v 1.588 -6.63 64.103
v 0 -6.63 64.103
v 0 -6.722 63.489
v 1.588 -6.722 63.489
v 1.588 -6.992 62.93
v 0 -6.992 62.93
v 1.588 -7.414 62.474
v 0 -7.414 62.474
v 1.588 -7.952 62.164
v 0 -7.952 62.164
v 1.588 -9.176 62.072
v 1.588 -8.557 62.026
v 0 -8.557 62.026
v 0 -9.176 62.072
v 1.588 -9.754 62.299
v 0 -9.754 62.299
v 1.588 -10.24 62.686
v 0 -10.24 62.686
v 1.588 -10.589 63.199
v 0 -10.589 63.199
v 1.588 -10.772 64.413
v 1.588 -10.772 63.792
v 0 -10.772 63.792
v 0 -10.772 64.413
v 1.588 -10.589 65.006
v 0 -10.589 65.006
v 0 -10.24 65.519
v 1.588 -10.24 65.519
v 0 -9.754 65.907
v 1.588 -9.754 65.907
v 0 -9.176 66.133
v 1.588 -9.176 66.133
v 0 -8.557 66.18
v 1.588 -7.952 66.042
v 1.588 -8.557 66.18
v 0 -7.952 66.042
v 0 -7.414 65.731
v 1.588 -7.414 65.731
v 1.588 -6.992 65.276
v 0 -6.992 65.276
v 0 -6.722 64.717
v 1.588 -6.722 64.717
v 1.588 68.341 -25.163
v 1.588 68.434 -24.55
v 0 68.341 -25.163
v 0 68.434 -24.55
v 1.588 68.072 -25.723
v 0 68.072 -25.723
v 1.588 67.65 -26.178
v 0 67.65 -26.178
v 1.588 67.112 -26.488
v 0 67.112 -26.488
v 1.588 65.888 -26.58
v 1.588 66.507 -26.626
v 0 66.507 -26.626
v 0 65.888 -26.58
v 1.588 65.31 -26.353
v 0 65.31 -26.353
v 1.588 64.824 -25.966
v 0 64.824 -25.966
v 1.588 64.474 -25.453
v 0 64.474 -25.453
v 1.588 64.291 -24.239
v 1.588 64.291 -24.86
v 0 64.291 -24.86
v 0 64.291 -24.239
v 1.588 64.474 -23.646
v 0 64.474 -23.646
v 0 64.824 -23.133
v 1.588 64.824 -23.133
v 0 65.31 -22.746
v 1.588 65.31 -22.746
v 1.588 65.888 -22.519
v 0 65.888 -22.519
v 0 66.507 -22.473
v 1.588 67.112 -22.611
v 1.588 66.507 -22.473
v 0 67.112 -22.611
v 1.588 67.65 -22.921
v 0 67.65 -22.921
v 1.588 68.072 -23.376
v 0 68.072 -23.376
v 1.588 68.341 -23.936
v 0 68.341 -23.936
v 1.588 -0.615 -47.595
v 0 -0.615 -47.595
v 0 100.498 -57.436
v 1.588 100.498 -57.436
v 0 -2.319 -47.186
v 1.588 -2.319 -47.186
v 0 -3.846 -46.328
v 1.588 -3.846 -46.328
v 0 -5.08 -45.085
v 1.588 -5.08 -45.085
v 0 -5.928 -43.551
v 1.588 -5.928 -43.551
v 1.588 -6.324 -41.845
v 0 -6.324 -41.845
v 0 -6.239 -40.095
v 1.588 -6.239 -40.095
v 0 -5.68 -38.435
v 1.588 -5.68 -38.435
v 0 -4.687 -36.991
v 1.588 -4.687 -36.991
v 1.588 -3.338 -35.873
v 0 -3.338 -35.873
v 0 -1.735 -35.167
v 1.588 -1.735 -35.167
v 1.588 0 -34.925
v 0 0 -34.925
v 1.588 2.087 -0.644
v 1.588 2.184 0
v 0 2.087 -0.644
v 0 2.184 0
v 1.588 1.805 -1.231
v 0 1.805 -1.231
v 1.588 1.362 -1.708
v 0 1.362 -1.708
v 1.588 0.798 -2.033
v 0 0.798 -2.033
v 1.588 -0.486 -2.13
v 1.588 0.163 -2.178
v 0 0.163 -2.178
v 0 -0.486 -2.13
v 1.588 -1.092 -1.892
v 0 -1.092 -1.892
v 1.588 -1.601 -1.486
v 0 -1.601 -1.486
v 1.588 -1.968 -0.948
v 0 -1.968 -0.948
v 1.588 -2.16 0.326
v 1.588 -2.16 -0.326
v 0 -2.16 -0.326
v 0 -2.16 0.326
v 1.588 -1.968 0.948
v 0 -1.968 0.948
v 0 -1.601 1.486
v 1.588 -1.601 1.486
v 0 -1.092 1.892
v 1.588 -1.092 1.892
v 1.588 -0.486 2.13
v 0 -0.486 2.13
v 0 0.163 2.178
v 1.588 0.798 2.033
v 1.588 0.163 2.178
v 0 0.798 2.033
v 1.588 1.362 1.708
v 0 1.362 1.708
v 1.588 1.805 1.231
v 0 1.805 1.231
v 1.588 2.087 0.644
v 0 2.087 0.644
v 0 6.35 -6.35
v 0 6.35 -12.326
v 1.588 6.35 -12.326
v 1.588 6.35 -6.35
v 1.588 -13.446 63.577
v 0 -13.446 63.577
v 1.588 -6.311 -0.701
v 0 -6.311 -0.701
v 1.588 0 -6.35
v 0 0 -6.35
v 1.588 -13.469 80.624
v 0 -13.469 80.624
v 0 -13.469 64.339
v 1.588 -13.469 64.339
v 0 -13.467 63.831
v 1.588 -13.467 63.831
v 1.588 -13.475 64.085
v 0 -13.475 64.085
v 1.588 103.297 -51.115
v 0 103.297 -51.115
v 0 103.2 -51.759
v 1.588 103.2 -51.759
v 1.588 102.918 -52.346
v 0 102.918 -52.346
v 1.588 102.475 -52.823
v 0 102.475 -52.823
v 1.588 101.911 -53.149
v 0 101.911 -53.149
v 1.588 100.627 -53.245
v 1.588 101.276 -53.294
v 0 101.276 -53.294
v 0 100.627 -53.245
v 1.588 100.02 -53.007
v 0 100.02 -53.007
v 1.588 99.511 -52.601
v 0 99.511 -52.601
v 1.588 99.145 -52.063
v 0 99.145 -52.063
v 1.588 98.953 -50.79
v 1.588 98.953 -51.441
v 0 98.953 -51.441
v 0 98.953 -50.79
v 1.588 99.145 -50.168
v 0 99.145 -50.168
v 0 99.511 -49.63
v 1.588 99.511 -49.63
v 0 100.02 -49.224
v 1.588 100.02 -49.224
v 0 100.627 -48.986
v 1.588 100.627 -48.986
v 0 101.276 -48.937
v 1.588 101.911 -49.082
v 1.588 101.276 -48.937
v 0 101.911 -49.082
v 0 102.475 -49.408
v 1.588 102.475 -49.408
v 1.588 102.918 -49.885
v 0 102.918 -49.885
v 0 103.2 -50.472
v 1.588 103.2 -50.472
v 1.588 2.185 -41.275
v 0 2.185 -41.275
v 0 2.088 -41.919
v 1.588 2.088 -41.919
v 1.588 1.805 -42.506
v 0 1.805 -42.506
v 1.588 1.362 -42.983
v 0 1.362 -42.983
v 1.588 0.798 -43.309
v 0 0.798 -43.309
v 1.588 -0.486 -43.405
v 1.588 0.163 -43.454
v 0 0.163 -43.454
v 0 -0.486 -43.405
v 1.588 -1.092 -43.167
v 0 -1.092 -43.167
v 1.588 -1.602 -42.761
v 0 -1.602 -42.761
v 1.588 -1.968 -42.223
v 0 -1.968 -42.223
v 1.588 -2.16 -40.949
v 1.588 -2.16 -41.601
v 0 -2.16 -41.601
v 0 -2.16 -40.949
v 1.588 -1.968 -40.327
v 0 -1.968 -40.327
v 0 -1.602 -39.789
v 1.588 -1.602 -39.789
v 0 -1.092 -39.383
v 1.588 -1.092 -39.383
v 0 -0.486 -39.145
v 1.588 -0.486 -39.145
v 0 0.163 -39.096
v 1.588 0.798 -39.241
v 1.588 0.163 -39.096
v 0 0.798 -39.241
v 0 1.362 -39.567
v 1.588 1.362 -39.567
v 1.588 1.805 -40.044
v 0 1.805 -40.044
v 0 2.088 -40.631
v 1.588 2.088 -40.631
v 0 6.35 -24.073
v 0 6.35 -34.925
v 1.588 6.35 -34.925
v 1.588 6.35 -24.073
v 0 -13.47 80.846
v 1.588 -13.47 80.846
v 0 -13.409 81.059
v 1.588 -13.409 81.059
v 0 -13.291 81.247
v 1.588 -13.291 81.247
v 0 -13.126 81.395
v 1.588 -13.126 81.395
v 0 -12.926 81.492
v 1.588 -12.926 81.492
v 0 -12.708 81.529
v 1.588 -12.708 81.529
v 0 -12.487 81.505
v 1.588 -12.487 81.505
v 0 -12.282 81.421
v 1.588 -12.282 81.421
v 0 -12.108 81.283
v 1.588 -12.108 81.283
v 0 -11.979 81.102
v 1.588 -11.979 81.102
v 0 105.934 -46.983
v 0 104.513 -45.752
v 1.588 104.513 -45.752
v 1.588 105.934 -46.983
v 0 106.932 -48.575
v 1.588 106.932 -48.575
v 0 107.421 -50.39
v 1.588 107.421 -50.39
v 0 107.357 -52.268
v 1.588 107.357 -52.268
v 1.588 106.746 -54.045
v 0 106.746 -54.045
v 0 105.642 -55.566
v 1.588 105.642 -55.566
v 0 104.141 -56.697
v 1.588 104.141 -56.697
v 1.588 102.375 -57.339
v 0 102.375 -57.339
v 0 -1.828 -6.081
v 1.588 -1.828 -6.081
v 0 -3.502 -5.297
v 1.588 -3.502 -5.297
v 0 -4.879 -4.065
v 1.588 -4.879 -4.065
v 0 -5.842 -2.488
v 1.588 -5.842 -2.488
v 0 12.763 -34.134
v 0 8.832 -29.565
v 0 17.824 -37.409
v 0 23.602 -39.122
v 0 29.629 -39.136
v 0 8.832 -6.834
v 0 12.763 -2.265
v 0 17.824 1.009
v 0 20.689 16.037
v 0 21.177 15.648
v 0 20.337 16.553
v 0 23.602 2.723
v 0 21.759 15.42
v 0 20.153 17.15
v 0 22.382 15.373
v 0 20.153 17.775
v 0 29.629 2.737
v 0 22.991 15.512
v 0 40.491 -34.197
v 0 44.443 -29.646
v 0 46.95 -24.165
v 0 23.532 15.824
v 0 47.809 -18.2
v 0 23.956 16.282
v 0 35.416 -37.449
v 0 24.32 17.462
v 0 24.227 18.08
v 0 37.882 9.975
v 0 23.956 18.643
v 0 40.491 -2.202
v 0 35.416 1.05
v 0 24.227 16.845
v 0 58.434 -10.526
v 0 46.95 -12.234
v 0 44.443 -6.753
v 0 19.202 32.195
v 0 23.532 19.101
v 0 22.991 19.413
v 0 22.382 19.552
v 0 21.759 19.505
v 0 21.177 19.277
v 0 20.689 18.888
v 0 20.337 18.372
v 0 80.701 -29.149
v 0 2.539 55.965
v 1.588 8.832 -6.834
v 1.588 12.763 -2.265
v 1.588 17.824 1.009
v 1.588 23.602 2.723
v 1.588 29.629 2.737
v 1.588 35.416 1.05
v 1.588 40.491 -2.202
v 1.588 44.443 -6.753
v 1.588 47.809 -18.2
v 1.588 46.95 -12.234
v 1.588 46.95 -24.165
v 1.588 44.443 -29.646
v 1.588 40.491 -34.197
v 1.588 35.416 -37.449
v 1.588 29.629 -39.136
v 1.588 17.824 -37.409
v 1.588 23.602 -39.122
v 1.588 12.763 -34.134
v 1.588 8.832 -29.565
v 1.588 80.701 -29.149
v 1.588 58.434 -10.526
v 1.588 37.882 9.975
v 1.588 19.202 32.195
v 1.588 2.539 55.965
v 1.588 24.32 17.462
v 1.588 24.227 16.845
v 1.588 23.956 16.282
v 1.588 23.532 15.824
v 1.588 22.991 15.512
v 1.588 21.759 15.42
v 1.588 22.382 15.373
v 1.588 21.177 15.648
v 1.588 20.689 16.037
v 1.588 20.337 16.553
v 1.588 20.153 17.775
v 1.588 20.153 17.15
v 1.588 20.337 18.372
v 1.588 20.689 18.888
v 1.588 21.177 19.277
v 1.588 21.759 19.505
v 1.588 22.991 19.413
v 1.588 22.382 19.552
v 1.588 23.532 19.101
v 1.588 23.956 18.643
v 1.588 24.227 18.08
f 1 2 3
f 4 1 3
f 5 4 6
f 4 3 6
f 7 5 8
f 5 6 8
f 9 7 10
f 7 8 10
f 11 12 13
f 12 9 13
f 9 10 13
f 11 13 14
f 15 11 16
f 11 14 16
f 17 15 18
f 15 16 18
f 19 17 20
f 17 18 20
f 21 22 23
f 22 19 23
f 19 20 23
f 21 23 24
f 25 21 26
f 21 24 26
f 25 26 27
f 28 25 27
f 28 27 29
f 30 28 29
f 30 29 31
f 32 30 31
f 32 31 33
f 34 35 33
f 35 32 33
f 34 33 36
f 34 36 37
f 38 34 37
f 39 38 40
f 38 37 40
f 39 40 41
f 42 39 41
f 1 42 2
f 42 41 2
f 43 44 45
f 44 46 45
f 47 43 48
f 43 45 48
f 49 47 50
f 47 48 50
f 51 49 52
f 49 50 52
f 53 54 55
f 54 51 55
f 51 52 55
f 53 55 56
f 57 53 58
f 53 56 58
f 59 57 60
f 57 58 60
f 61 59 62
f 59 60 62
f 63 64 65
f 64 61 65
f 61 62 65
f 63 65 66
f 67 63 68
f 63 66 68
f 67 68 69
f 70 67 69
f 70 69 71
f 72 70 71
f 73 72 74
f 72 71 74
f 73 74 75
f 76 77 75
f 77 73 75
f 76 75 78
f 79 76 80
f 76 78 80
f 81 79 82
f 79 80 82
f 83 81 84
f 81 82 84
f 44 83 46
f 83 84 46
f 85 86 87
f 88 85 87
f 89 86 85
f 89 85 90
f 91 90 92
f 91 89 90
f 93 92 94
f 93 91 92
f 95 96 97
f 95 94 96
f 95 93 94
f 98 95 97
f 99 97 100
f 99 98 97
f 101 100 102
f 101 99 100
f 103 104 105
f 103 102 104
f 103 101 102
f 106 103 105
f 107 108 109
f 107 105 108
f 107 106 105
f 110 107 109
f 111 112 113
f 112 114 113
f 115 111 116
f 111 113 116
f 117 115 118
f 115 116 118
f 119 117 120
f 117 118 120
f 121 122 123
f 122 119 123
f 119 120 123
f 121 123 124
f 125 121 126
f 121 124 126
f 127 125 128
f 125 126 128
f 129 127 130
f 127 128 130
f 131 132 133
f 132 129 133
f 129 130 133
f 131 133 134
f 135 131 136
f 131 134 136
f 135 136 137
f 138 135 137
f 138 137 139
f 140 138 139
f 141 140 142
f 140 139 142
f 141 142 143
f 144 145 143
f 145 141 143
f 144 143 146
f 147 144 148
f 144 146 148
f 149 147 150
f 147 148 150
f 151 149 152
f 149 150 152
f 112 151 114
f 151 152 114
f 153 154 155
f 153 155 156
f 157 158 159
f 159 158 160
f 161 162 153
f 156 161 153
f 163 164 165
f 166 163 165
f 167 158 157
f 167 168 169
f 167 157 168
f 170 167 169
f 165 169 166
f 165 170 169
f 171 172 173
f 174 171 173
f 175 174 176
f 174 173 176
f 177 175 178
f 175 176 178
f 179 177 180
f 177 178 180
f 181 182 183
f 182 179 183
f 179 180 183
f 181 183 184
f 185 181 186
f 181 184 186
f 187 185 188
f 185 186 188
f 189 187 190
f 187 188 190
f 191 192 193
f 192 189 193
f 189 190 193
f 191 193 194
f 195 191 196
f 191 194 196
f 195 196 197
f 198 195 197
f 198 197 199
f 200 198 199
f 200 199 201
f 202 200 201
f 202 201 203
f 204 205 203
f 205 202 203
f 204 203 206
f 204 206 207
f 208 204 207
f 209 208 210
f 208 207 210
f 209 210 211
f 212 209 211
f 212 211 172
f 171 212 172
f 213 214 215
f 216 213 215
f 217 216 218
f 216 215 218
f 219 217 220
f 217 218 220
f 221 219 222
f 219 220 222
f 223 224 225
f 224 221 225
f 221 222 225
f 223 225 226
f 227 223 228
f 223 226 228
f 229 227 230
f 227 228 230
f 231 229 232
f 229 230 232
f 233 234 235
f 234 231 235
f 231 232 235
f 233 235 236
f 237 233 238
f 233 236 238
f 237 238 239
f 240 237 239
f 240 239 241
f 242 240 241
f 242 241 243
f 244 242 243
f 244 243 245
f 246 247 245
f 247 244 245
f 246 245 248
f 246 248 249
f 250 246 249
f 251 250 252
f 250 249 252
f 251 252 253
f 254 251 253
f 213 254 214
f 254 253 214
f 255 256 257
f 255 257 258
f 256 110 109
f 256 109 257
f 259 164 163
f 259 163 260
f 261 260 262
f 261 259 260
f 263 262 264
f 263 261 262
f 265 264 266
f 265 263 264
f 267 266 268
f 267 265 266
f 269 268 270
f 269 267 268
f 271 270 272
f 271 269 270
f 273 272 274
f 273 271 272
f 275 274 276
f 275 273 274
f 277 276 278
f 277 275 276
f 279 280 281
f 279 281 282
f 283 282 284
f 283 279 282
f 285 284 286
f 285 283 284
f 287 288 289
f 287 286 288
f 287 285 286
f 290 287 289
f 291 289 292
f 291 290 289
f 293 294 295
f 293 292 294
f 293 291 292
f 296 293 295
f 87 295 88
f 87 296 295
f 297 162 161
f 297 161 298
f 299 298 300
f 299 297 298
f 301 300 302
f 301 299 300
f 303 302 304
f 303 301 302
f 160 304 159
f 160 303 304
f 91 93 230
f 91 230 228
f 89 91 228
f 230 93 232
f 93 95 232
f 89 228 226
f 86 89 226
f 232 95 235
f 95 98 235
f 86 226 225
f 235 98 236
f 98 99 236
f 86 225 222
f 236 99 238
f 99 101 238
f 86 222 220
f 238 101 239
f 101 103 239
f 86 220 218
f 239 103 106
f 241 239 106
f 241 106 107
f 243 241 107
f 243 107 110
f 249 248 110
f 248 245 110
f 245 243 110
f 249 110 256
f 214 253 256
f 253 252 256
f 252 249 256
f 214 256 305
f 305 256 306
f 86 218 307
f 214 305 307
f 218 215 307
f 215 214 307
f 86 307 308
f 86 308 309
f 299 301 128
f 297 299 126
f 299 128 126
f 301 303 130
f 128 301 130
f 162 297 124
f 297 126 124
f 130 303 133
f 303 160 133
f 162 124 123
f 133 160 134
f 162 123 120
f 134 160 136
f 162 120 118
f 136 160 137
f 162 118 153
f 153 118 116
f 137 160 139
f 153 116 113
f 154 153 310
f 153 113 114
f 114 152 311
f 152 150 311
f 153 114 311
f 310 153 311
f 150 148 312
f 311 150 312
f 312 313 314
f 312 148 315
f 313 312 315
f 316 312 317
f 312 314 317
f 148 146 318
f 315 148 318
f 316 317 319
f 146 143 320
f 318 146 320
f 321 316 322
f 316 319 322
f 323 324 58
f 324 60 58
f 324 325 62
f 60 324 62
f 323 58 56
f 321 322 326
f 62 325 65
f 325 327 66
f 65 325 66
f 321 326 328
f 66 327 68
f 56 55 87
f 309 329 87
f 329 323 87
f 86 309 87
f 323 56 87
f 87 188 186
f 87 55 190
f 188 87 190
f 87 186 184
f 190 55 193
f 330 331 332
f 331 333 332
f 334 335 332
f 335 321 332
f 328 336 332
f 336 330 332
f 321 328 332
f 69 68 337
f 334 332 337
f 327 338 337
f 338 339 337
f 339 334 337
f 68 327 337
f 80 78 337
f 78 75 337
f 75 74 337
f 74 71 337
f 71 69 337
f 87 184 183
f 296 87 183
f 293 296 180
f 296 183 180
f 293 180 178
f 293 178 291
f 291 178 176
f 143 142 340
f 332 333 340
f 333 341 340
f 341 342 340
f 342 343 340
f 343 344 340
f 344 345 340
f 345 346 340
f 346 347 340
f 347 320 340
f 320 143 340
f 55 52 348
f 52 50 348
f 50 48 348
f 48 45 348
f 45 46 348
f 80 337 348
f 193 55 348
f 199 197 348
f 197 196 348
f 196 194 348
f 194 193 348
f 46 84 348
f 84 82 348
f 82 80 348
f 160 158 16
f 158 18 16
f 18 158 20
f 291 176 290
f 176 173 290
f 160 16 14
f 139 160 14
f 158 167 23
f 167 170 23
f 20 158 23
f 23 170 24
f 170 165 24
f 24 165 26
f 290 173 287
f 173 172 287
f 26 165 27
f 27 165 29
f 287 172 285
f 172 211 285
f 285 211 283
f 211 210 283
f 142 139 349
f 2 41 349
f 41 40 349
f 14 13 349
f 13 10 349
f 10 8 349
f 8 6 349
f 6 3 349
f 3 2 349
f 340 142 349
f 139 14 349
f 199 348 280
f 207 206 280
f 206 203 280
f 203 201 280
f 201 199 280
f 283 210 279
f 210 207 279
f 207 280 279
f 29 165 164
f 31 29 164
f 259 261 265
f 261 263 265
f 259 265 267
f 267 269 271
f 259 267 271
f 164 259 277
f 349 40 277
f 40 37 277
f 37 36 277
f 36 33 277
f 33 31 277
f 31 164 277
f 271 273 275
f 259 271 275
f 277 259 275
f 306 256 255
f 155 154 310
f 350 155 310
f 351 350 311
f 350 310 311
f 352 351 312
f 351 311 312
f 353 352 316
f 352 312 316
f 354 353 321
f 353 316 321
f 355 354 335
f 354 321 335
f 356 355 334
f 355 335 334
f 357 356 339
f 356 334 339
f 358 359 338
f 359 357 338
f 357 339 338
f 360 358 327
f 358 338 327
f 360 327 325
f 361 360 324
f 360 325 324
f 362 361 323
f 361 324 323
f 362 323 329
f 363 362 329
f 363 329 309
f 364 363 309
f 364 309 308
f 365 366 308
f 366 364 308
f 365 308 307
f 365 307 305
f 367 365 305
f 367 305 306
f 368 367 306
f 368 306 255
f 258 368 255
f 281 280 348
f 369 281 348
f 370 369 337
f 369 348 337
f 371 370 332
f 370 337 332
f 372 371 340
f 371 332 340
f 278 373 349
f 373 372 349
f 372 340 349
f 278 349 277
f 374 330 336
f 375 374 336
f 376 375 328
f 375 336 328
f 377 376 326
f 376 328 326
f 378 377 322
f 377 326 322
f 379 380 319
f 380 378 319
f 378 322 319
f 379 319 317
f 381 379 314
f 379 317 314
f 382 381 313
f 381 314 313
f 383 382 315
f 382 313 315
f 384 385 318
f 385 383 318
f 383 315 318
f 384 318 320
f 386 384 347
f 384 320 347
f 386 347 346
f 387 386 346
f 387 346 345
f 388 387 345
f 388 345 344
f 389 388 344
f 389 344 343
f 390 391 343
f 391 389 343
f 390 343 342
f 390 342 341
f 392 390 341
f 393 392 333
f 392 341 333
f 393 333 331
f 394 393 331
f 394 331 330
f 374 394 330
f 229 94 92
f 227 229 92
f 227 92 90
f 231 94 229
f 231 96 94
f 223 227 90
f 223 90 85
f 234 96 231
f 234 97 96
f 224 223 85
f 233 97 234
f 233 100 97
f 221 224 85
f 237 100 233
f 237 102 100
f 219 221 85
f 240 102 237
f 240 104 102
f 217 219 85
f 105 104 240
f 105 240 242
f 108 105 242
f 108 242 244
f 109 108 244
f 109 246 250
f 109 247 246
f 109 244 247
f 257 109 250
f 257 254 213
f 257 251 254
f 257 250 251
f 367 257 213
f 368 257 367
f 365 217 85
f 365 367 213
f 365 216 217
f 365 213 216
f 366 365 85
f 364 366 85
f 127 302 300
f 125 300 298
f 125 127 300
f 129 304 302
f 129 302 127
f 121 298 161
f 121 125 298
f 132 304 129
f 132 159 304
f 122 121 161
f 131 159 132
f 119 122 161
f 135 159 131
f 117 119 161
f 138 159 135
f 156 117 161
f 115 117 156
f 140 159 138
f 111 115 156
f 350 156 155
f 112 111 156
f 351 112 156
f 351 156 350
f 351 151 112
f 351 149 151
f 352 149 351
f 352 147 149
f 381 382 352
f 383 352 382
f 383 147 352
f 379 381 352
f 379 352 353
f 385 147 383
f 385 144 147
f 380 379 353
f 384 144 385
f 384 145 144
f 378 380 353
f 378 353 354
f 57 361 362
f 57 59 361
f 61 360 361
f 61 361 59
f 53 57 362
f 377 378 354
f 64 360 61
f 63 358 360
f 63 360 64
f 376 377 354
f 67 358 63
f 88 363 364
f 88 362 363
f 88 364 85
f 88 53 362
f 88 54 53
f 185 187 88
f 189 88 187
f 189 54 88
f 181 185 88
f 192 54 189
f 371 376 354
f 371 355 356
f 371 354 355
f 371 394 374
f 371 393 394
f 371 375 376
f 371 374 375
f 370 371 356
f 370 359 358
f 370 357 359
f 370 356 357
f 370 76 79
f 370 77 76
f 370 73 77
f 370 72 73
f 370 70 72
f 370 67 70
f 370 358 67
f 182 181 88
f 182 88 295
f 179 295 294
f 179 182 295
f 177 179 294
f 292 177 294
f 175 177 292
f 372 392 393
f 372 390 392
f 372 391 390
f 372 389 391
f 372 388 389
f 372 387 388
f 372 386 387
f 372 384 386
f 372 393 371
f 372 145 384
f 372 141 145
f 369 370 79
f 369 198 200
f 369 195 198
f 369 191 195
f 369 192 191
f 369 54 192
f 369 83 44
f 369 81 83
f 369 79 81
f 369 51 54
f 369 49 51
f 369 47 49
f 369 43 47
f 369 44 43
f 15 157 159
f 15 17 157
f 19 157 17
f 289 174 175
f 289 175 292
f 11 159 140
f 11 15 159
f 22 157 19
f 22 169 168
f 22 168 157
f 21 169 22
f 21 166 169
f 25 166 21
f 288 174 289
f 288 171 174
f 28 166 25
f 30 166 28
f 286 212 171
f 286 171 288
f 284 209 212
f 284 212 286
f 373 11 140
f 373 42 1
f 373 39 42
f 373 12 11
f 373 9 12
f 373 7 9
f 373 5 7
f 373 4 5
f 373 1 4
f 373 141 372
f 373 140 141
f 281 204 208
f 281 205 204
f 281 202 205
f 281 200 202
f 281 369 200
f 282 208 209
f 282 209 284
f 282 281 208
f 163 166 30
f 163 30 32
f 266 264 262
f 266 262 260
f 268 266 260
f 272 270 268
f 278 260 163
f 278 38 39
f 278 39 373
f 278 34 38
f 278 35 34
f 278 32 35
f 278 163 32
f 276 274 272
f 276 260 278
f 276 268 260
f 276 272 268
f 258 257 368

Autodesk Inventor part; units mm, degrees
ref_plane "YZ Plane" through (0, 0, 0) normal (1, 0, 0) x (0, 1, 0)
ref_plane "XZ Plane" through (0, 0, 0) normal (0, 1, 0) x (-1, 0, 0)
ref_plane "XY Plane" through (0, 0, 0) normal (0, 0, 1) x (1, 0, 0)
sketch "main" plane through (0, 0, 0) normal (0, 0, 1) x (1, 0, 0)
  circle A0 centre (-198.1135, 49.9495) radius 2.1844
  circle A1 centre (-97.0008, -1.1659) radius 2.1
  arc A2 (-97.6159, -7.486) -> (-93.6005, 4.197) centre (-97.0008, -1.1659) ccw
  arc A3 (-204.4247, 49.249) -> (-198.1135, 43.5995) centre (-198.1135, 49.9495) ccw
  arc A4 (-210.0929, 131.0519) -> (-93.6005, 4.197) centre (83.8489, 284.0666) ccw
  circle A5 centre (-206.8262, 114.0524) radius 2.0828
  arc A6 (-210.0929, 131.0519) -> (-211.5759, 130.5326) centre (-210.797, 130.6854) ccw
  circle A7 centre (-131.7625, 25.4) radius 2.0828
  line L0 (-198.7286, 2.3544) -> (-97.6159, -7.486)
  circle A8 centre (-198.1135, 8.6745) radius 2.1848
  arc A9 (-198.1135, 15.0245) -> (-198.7286, 2.3544) centre (-198.1135, 8.6745) ccw
  line L1 (-211.5828, 130.7972) -> (-211.5828, 113.8158)
  arc A10 (-211.5828, 114.289) -> (-211.5596, 113.527) centre (-206.8262, 114.0524) ccw
  line L2 (-211.5596, 113.527) -> (-204.4247, 49.249)
  circle A11 centre (-175.8885, 67.412) radius 2.0955
  arc A12 (-191.7635, 25.8768) -> (-191.7635, 37.6232) centre (-171.45, 31.75) ccw
  line L3 (-191.7635, 43.5995) -> (-191.7635, 37.6232)
  line L4 (-191.7635, 15.0245) -> (-191.7635, 25.8768)
  point P0 (1.1251, 9.7944)
  point P1 (-211.9386, 134.6509)
  point P2 (-191.7635, 49.9495)
  dimension "d7" = 12.7
  dimension "d8" = 4.1656
  dimension "d9" = 6.35
  dimension "d13" = 4.1656
  dimension "d20" = 0
  dimension "d21" = 6.35
  dimension "d26" = 9.525
  dimension "d27" = 4.191
  dimension "d29" = 42.291
sketch "Sketch1" plane through (0, 0, 0) normal (1, 0, 0) x (0, 1, 0)
  line L0 (6.35, -9.525) -> (6.35, -7.9375) projected
  line L1 (0, -6.35) -> (6.35, -6.35)
  line L2 (0, -34.925) -> (6.35, -34.925)
  circle A0 centre (101.1127, -51.1154) radius 2.1844 projected
  circle A1 centre (0, 0) radius 2.1844
  circle A2 centre (101.1127, -51.1154) radius 2.1
  arc A3 (100.4976, -57.4355) -> (104.5129, -45.7525) centre (101.1127, -51.1154) ccw
  arc A4 (-6.3112, -0.7006) -> (0, -6.35) centre (0, 0) ccw
  arc A5 (-11.9794, 81.1024) -> (104.5129, -45.7525) centre (281.9624, 234.117) ccw
  circle A6 centre (-8.7127, 64.1028) radius 2.0828
  arc A7 (-11.9794, 81.1024) -> (-13.4624, 80.5831) centre (-12.6835, 80.7359) ccw
  circle A8 centre (66.351, -24.5495) radius 2.0828
  line L3 (-0.6151, -47.5951) -> (100.4976, -57.4355)
  circle A9 centre (0, -41.275) radius 2.1848
  arc A10 (0, -34.925) -> (-0.6151, -47.5951) centre (0, -41.275) ccw
  line L4 (-13.4693, 80.8476) -> (-13.4693, 63.8663)
  arc A11 (-13.4693, 64.3394) -> (-13.4461, 63.5774) centre (-8.7127, 64.1028) ccw
  line L5 (-13.4461, 63.5774) -> (-6.3112, -0.7006)
  circle A12 centre (22.225, 17.4625) radius 2.0955
  arc A13 (6.35, -24.0727) -> (6.35, -12.3264) centre (26.6635, -18.1995) ccw
  line L6 (6.35, -6.35) -> (6.35, -12.3264)
  line L7 (6.35, -34.925) -> (6.35, -24.0727)
  point P0 (0, -6.35)
  point P1 (0, -34.925)
  point P2 (-13.4693, 80.6241)
  point P3 (6.35, -6.35)
  point P4 (6.35, -34.925)
extrude "Extrusion1" add sketch "Sketch1" along normal blind 1.5875 contours L0 L6 L1 A4 L5 A11 L4 A7 A5 A3 L3 A10 L2 L7 A13 | A11 L4 | A7 L4
equation "\"BendRadius\" = Thickness"
equation "\"BendReliefWidth\" = Thickness"
equation "\"BendReliefDepth\" = 0.5 * Thickness"
equation "\"CornerReliefSize\" = 4 * Thickness"
equation "\"MinimumRemnant\" = 2 * Thickness"
equation "\"TransitionRadius\" = BendRadius"
equation "\"JacobiRadiusSize\" = BendRadius"
equation "\"GapSize\" = Thickness"
equation "\"Thickness\" = 1.5875"
properties part number "Ramp V2" material "Acetal Resin, White"
